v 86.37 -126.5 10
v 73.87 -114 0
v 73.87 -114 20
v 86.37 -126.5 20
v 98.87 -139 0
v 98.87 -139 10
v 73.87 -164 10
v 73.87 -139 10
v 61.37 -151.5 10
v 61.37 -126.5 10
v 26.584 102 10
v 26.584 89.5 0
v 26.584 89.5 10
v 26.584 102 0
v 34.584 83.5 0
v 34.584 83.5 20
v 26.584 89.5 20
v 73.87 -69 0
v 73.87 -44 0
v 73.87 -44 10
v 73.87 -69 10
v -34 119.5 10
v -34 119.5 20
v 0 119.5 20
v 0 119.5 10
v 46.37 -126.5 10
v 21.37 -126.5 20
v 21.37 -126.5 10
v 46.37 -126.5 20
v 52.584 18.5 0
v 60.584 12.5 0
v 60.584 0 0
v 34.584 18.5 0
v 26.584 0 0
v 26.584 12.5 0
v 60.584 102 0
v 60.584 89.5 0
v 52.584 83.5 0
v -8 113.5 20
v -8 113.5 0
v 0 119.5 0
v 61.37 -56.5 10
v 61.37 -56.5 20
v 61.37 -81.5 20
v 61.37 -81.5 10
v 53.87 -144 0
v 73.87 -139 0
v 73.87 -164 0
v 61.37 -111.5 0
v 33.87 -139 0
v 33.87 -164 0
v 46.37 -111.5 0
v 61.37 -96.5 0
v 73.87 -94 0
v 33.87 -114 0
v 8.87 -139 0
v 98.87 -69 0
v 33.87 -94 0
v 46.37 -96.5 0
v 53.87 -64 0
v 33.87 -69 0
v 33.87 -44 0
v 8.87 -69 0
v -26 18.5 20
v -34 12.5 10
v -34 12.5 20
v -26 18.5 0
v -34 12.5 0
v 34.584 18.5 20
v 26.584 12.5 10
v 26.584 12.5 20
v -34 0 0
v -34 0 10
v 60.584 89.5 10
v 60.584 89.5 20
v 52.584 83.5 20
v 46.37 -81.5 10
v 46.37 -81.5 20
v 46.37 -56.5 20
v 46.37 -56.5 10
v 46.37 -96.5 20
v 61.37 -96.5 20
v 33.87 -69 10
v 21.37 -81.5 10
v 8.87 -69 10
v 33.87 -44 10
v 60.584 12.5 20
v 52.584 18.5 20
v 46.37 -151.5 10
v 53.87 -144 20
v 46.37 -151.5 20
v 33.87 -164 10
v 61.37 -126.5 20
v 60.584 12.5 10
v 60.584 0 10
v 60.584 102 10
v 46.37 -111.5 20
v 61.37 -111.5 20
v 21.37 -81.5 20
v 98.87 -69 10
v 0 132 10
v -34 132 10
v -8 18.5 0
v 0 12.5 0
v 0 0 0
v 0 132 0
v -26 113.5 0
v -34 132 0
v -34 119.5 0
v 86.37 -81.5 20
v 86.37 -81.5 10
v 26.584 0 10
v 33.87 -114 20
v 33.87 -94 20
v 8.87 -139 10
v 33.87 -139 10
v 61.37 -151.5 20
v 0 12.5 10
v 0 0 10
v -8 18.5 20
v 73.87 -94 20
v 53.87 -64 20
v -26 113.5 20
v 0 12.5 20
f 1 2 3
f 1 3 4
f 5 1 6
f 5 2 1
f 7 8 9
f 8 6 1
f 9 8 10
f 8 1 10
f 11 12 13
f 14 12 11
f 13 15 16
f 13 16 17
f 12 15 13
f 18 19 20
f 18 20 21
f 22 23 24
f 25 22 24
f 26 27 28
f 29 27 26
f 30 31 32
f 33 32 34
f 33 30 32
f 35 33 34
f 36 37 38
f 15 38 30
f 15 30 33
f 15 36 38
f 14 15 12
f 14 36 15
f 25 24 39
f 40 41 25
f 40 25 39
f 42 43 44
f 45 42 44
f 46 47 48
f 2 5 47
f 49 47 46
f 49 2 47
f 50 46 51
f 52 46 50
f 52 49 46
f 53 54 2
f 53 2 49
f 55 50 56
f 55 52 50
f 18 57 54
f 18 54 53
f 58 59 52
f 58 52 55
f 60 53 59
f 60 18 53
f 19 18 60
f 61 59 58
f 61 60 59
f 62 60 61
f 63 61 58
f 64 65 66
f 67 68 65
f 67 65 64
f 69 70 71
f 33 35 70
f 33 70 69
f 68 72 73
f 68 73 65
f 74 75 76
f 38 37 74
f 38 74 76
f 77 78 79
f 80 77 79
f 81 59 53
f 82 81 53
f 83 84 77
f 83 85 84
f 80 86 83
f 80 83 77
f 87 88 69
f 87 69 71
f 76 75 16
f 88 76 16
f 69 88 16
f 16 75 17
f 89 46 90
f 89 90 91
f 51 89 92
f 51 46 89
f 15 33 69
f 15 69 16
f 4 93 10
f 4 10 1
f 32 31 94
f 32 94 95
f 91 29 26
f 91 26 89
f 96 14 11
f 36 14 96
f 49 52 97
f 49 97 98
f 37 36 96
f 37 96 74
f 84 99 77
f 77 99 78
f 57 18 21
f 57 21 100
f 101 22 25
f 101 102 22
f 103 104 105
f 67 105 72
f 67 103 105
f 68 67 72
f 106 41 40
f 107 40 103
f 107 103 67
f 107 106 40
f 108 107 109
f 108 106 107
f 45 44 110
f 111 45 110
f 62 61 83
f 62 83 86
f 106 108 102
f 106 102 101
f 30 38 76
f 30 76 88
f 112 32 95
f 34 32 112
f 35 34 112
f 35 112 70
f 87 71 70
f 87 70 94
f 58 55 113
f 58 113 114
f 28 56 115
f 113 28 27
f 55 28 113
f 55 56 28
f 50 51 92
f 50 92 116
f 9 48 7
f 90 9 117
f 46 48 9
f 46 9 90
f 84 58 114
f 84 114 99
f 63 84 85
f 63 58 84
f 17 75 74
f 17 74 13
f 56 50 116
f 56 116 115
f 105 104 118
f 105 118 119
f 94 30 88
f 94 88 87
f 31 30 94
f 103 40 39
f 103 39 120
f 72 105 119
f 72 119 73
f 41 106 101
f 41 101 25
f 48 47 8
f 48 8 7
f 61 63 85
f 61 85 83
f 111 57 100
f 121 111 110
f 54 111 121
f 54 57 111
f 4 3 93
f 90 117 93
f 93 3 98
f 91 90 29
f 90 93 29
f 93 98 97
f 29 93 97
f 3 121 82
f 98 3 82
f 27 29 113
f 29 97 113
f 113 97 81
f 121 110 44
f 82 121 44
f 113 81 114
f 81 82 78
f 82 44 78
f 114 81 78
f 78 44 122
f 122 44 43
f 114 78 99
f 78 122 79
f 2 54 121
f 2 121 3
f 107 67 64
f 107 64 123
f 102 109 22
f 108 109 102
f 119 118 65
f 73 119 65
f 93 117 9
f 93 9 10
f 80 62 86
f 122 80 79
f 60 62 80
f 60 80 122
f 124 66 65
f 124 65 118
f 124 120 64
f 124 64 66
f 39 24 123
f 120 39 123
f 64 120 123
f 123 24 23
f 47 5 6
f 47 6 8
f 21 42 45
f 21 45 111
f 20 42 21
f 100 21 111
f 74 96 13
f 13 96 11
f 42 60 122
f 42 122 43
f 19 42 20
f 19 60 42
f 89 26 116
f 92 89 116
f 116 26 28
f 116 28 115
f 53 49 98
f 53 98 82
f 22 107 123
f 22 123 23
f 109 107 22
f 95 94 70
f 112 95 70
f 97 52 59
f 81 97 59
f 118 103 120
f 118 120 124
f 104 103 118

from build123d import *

# Parameters (mm, degrees)
PAD_DEPTH       = 20
POCKET_DEPTH    = 10
POCKET001_DEPTH = 10
PAD001_DEPTH    = 20
POCKET002_DEPTH = 10
PAD002_DEPTH    = 20
POCKET003_DEPTH = 10
POCKET004_DEPTH = 10
SKETCH008_W     = 15
SKETCH008_H     = 15
POCKET005_DEPTH = 20


with BuildPart() as body:
    # Sketch → Pad (new body)
    with BuildSketch(Plane.XY):
        Polygon((-33.999992, 131.999989), (8e-06, 131.999989), (8e-06, 119.499989), (-7.999985, 113.49998), (-7.999985, 18.49998), (3e-05, 12.5), (0, 0), (-34, 0), (-34, 12.5), (-25.999985, 18.49998), (-25.999985, 113.49998), (-33.999979, 119.499989), align=None)
    extrude(amount=PAD_DEPTH)

    # Sketch003 (on Face14 of Pad) → Pocket (cut)
    with BuildSketch(Plane.XY.offset(20)):
        Polygon((-34, 12.5), (3e-05, 12.5), (0, 0), (-34, 0), align=None)
    extrude(amount=-POCKET_DEPTH, mode=Mode.SUBTRACT)

    # Sketch004 (on Face5 of Pocket) → Pocket001 (cut)
    with BuildSketch(Plane.XY.offset(20)):
        Polygon((-33.999979, 119.499989), (8e-06, 119.499989), (8e-06, 131.999989), (-33.999992, 131.999989), align=None)
    extrude(amount=-POCKET001_DEPTH, mode=Mode.SUBTRACT)


with BuildPart() as i2_4cm:
    # Sketch001 → Pad001 (new body)
    with BuildSketch(Plane.XY):
        Polygon((-33.999992, 101.999989), (8e-06, 101.999989), (8e-06, 89.499989), (-7.999985, 83.49998), (-7.999985, 18.49998), (3e-05, 12.5), (0, 0), (-34, 0), (-34, 12.5), (-25.999985, 18.49998), (-25.999985, 83.49998), (-33.999979, 89.499989), align=None)
    extrude(amount=PAD001_DEPTH)

    # Sketch005 (on Face14 of Pad001) → Pocket002 (cut)
    with BuildSketch(Plane.XY.offset(20)):
        Polygon((-34, 12.5), (3e-05, 12.5), (0, 0), (-34, 0), align=None)
        Polygon((-33.999979, 89.499989), (-33.999992, 101.999989), (8e-06, 101.999989), (8e-06, 89.499989), align=None)
    extrude(amount=-POCKET002_DEPTH, mode=Mode.SUBTRACT)


with BuildPart() as i2_4cm_1:
    # Body001 placement: moved
    add(i2_4cm.part.moved(Location((60.5835, 0, 0))))


with BuildPart() as star:
    # Sketch002 → Pad002 (new body)
    with BuildSketch(Plane.XY):
        Polygon((33.87, -44), (53.87, -64), (73.87, -44), (73.87, -69), (98.87, -69), (73.87, -94), (73.87, -114), (98.87, -139), (73.87, -139), (73.87, -164), (53.87, -144), (33.87, -164), (33.87, -139), (8.87, -139), (33.87, -114), (33.87, -94), (8.87, -69), (33.87, -69), align=None)
    extrude(amount=PAD002_DEPTH)

    # Sketch006 (on Face20 of Pad002) → Pocket003 (cut)
    with BuildSketch(Plane.XY.offset(20)):
        Polygon((21.37, -126.5), (46.37, -126.5), (46.37, -151.5), (33.87, -164), (33.87, -139), (8.87, -139), align=None)
        Polygon((21.37, -81.5), (46.37, -81.5), (46.37, -56.5), (33.87, -44), (33.87, -69), (8.87, -69), align=None)
        Polygon((73.87, -44), (61.37, -56.5), (61.37, -81.5), (86.37, -81.5), (98.87, -69), (73.87, -69), align=None)
    extrude(amount=-POCKET003_DEPTH, mode=Mode.SUBTRACT)

    # Sketch007 (on Face23 of Pocket003) → Pocket004 (cut)
    with BuildSketch(Plane.XY.offset(20)):
        Polygon((61.37, -151.5), (61.37, -126.5), (86.37, -126.5), (98.87, -139), (73.87, -139), (73.87, -164), align=None)
    extrude(amount=-POCKET004_DEPTH, mode=Mode.SUBTRACT)

    # Sketch008 → Pocket005 (cut)
    with BuildSketch(Plane.XY):
        with Locations((53.87, -104)):
            Rectangle(SKETCH008_W, SKETCH008_H)
    extrude(amount=POCKET005_DEPTH, mode=Mode.SUBTRACT)


solid = Compound([body.part, i2_4cm_1.part, star.part])
